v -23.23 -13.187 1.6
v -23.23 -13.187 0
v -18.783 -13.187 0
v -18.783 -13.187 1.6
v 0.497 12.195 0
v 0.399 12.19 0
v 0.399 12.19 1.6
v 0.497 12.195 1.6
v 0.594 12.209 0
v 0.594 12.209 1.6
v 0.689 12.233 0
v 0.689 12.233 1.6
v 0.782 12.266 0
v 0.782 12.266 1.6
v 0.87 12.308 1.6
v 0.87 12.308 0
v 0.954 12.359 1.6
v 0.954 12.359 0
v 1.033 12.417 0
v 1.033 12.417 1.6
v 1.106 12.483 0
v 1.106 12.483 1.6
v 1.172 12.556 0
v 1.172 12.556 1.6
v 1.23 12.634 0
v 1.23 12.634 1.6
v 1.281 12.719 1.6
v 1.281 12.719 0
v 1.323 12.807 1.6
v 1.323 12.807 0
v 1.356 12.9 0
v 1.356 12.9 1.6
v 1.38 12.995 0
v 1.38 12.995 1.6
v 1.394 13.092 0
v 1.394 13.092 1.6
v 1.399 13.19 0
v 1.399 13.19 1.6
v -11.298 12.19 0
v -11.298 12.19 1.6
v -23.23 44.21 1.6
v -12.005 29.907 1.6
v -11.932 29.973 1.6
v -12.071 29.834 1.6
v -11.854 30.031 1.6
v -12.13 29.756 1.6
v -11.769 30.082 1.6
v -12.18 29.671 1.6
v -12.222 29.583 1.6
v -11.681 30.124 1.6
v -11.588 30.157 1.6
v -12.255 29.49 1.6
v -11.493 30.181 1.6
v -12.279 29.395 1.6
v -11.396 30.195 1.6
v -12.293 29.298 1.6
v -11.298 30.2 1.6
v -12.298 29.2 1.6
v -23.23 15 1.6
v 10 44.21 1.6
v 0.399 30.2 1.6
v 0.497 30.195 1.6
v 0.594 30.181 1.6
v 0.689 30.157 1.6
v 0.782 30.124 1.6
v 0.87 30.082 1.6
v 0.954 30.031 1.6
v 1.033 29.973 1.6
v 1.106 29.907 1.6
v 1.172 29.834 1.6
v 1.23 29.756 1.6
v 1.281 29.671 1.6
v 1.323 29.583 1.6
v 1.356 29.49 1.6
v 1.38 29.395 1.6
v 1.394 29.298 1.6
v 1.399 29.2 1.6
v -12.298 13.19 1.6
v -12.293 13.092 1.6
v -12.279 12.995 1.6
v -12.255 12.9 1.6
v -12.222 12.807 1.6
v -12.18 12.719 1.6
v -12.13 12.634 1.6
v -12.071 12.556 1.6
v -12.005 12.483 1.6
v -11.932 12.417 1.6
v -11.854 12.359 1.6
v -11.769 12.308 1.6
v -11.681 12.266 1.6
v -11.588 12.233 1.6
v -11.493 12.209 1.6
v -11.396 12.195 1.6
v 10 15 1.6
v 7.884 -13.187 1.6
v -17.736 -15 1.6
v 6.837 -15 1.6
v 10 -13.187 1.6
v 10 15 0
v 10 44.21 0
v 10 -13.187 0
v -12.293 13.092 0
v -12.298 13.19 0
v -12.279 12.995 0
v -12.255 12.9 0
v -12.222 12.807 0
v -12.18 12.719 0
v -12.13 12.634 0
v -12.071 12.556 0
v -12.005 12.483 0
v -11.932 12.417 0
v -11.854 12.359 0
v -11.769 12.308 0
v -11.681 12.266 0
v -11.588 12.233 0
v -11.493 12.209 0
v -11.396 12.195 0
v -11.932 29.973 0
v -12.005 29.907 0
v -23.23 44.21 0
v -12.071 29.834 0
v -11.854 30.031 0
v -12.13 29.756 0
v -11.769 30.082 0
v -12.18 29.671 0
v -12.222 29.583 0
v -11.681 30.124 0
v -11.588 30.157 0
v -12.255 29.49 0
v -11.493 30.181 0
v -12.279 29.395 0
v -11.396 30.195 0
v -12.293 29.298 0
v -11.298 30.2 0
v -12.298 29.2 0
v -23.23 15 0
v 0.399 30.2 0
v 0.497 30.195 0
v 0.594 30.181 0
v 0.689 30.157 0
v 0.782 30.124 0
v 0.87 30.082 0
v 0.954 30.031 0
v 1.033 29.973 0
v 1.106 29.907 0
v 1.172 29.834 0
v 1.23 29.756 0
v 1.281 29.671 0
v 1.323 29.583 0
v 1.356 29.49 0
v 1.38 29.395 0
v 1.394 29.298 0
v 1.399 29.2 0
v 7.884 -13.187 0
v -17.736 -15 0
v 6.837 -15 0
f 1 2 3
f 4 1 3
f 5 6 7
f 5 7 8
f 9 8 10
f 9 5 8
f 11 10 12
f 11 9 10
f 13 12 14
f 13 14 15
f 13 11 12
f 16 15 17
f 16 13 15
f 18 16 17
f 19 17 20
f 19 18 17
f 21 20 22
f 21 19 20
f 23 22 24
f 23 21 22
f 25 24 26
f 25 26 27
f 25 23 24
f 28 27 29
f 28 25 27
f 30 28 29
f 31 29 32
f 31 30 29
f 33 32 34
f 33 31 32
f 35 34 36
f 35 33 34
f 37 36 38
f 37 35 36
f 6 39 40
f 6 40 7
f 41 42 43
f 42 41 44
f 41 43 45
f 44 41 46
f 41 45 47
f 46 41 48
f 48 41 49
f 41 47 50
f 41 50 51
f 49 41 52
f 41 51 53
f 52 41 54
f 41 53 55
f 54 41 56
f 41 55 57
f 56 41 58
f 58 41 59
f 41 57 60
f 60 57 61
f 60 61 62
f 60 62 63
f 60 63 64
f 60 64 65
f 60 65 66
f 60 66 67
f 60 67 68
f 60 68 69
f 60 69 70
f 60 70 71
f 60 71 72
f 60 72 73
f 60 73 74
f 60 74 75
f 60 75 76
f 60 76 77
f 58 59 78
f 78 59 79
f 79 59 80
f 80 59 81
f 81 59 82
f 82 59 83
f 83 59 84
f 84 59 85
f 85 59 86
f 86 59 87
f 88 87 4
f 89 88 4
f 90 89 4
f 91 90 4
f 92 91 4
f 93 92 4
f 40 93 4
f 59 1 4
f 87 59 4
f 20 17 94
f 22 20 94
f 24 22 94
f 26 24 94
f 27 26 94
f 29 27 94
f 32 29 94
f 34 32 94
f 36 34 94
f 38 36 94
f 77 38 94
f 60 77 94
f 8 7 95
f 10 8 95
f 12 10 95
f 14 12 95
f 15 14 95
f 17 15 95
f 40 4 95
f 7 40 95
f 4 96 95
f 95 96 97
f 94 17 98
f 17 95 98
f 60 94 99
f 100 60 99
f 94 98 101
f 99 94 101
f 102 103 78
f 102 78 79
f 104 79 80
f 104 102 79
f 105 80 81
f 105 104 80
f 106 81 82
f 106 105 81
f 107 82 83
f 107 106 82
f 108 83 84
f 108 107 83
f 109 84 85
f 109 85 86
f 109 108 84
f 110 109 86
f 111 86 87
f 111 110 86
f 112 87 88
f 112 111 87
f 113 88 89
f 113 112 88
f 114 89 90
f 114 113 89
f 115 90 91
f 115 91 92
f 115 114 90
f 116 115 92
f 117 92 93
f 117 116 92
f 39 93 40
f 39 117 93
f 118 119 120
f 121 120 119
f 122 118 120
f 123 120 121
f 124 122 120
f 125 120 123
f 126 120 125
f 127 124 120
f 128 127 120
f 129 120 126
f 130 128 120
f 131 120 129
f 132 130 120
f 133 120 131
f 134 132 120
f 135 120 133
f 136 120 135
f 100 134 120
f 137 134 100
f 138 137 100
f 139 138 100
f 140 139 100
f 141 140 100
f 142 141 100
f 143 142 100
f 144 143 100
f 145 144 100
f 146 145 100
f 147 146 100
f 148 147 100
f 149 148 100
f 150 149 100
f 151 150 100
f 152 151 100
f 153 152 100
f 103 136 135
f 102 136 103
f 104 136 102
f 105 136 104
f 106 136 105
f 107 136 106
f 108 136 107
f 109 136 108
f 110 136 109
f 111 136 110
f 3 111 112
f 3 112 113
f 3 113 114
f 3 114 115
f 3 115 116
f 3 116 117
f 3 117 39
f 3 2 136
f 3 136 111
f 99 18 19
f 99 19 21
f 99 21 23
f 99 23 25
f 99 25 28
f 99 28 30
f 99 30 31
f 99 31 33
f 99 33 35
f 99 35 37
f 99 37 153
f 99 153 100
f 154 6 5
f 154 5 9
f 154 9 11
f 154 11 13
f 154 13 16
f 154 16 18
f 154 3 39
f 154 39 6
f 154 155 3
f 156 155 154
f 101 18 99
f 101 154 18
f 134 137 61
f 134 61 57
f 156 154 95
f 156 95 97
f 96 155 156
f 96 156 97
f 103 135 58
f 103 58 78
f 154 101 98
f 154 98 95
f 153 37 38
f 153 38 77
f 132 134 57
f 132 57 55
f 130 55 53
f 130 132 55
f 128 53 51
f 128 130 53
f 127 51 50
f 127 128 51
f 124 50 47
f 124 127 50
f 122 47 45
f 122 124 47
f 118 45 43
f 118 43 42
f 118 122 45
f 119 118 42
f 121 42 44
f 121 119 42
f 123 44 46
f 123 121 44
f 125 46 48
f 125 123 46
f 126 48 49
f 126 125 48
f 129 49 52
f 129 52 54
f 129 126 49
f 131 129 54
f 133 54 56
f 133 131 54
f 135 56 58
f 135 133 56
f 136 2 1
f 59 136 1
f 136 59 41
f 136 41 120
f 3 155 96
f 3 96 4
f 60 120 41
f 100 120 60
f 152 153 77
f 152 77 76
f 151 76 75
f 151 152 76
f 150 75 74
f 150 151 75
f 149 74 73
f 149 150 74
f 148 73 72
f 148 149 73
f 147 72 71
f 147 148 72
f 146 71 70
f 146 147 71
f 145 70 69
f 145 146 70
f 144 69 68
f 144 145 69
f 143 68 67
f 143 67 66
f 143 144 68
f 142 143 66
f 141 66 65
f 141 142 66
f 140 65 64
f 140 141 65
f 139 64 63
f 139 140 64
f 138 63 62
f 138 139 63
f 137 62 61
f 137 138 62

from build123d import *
from OCP.BRepAlgoAPI import BRepAlgoAPI_Cut
from OCP.TopTools import TopTools_ListOfShape

# Parameters (mm, degrees)
SKETCH1_W           = 20
SKETCH1_H           = 30
BOSS_EXTRUDE1_DEPTH = 1.6
SKETCH2_W           = 1.6
SKETCH2_H           = 30
BOSS_EXTRUDE2_DEPTH = 13.22962
SKETCH3_W           = 33.229619685
SKETCH3_H           = 1.6
BOSS_EXTRUDE3_DEPTH = 29.21
CUT_EXTRUDE1_DEPTH  = 1.6
CUT_EXTRUDE2_DEPTH  = 29.21


with BuildPart() as part:
    # Sketch1 → Boss-Extrude1 (new body)
    with BuildSketch(Plane.XY):
        Rectangle(SKETCH1_W, SKETCH1_H)
    extrude(amount=BOSS_EXTRUDE1_DEPTH)

    # Sketch2 → Boss-Extrude2 (add)
    with BuildSketch(Plane.ZY.offset(10)):
        with Locations((0.8, 0)):
            Rectangle(SKETCH2_W, SKETCH2_H)
    extrude(amount=BOSS_EXTRUDE2_DEPTH)

    # Sketch3 → Boss-Extrude3 (add)
    with BuildSketch(Plane(origin=(0, 15, 0), x_dir=(1, 0, 0), z_dir=(0, 1, 0))):
        with Locations((-6.614809843, -0.8)):
            Rectangle(SKETCH3_W, SKETCH3_H)
    extrude(amount=BOSS_EXTRUDE3_DEPTH)

    # Sketch4 → Cut-Extrude1 (cut)
    with BuildSketch(Plane(origin=(0, 0, 0), x_dir=(-1, 0, 0), z_dir=(0, 0, -1))):
        with BuildLine():
            Line((-1.398817815, 13.19), (-1.398817815, 29.2))
            ThreePointArc((-1.398817815, 29.2), (-1.105924597, 29.907106781), (-0.398817815, 30.2))
            Line((-0.398817815, 30.2), (11.298057185, 30.2))
            ThreePointArc((11.298057185, 30.2), (12.005163966, 29.907106781), (12.298057185, 29.2))
            Line((12.298057185, 29.2), (12.298057185, 13.19))
            ThreePointArc((12.298057185, 13.19), (12.005163966, 12.482893219), (11.298057185, 12.19))
            Line((11.298057185, 12.19), (-0.398817815, 12.19))
            ThreePointArc((-0.398817815, 12.19), (-1.105924597, 12.482893219), (-1.398817815, 13.19))
        make_face()
    extrude(amount=-CUT_EXTRUDE1_DEPTH, mode=Mode.SUBTRACT)


with BuildPart() as cut_extrude2_tool:
    # Sketch5 → Cut-Extrude2 (new body)
    with BuildSketch(Plane(origin=(0, 0, 0), x_dir=(-1, 0, 0), z_dir=(0, 0, -1))):
        Polygon((-7.883969717, -13.186759938), (-6.837095086, -15), (-10, -15), (-10, -13.186759938), align=None)
        Polygon((17.736334458, -15), (18.783209096, -13.186759938), (19.63963747, -13.186759938), (23.229619685, -13.186759938), (23.229619685, -15), align=None)
    extrude(amount=-CUT_EXTRUDE2_DEPTH)


with BuildPart() as part_1:
    add(part.part)

    # Cut-Extrude2: cut by cut_extrude2_tool, with a tolerance
    cut_extrude2_stock = TopTools_ListOfShape()
    cut_extrude2_stock.Append(part_1.part.wrapped)
    cut_extrude2_tools = TopTools_ListOfShape()
    cut_extrude2_tools.Append(cut_extrude2_tool.part.wrapped)
    cut_extrude2_cut = BRepAlgoAPI_Cut()
    cut_extrude2_cut.SetArguments(cut_extrude2_stock)
    cut_extrude2_cut.SetTools(cut_extrude2_tools)
    cut_extrude2_cut.SetFuzzyValue(0.00001)
    cut_extrude2_cut.Build()
    add(Compound.cast(cut_extrude2_cut.Shape()).solids(), mode=Mode.REPLACE)


solid = part_1.part
